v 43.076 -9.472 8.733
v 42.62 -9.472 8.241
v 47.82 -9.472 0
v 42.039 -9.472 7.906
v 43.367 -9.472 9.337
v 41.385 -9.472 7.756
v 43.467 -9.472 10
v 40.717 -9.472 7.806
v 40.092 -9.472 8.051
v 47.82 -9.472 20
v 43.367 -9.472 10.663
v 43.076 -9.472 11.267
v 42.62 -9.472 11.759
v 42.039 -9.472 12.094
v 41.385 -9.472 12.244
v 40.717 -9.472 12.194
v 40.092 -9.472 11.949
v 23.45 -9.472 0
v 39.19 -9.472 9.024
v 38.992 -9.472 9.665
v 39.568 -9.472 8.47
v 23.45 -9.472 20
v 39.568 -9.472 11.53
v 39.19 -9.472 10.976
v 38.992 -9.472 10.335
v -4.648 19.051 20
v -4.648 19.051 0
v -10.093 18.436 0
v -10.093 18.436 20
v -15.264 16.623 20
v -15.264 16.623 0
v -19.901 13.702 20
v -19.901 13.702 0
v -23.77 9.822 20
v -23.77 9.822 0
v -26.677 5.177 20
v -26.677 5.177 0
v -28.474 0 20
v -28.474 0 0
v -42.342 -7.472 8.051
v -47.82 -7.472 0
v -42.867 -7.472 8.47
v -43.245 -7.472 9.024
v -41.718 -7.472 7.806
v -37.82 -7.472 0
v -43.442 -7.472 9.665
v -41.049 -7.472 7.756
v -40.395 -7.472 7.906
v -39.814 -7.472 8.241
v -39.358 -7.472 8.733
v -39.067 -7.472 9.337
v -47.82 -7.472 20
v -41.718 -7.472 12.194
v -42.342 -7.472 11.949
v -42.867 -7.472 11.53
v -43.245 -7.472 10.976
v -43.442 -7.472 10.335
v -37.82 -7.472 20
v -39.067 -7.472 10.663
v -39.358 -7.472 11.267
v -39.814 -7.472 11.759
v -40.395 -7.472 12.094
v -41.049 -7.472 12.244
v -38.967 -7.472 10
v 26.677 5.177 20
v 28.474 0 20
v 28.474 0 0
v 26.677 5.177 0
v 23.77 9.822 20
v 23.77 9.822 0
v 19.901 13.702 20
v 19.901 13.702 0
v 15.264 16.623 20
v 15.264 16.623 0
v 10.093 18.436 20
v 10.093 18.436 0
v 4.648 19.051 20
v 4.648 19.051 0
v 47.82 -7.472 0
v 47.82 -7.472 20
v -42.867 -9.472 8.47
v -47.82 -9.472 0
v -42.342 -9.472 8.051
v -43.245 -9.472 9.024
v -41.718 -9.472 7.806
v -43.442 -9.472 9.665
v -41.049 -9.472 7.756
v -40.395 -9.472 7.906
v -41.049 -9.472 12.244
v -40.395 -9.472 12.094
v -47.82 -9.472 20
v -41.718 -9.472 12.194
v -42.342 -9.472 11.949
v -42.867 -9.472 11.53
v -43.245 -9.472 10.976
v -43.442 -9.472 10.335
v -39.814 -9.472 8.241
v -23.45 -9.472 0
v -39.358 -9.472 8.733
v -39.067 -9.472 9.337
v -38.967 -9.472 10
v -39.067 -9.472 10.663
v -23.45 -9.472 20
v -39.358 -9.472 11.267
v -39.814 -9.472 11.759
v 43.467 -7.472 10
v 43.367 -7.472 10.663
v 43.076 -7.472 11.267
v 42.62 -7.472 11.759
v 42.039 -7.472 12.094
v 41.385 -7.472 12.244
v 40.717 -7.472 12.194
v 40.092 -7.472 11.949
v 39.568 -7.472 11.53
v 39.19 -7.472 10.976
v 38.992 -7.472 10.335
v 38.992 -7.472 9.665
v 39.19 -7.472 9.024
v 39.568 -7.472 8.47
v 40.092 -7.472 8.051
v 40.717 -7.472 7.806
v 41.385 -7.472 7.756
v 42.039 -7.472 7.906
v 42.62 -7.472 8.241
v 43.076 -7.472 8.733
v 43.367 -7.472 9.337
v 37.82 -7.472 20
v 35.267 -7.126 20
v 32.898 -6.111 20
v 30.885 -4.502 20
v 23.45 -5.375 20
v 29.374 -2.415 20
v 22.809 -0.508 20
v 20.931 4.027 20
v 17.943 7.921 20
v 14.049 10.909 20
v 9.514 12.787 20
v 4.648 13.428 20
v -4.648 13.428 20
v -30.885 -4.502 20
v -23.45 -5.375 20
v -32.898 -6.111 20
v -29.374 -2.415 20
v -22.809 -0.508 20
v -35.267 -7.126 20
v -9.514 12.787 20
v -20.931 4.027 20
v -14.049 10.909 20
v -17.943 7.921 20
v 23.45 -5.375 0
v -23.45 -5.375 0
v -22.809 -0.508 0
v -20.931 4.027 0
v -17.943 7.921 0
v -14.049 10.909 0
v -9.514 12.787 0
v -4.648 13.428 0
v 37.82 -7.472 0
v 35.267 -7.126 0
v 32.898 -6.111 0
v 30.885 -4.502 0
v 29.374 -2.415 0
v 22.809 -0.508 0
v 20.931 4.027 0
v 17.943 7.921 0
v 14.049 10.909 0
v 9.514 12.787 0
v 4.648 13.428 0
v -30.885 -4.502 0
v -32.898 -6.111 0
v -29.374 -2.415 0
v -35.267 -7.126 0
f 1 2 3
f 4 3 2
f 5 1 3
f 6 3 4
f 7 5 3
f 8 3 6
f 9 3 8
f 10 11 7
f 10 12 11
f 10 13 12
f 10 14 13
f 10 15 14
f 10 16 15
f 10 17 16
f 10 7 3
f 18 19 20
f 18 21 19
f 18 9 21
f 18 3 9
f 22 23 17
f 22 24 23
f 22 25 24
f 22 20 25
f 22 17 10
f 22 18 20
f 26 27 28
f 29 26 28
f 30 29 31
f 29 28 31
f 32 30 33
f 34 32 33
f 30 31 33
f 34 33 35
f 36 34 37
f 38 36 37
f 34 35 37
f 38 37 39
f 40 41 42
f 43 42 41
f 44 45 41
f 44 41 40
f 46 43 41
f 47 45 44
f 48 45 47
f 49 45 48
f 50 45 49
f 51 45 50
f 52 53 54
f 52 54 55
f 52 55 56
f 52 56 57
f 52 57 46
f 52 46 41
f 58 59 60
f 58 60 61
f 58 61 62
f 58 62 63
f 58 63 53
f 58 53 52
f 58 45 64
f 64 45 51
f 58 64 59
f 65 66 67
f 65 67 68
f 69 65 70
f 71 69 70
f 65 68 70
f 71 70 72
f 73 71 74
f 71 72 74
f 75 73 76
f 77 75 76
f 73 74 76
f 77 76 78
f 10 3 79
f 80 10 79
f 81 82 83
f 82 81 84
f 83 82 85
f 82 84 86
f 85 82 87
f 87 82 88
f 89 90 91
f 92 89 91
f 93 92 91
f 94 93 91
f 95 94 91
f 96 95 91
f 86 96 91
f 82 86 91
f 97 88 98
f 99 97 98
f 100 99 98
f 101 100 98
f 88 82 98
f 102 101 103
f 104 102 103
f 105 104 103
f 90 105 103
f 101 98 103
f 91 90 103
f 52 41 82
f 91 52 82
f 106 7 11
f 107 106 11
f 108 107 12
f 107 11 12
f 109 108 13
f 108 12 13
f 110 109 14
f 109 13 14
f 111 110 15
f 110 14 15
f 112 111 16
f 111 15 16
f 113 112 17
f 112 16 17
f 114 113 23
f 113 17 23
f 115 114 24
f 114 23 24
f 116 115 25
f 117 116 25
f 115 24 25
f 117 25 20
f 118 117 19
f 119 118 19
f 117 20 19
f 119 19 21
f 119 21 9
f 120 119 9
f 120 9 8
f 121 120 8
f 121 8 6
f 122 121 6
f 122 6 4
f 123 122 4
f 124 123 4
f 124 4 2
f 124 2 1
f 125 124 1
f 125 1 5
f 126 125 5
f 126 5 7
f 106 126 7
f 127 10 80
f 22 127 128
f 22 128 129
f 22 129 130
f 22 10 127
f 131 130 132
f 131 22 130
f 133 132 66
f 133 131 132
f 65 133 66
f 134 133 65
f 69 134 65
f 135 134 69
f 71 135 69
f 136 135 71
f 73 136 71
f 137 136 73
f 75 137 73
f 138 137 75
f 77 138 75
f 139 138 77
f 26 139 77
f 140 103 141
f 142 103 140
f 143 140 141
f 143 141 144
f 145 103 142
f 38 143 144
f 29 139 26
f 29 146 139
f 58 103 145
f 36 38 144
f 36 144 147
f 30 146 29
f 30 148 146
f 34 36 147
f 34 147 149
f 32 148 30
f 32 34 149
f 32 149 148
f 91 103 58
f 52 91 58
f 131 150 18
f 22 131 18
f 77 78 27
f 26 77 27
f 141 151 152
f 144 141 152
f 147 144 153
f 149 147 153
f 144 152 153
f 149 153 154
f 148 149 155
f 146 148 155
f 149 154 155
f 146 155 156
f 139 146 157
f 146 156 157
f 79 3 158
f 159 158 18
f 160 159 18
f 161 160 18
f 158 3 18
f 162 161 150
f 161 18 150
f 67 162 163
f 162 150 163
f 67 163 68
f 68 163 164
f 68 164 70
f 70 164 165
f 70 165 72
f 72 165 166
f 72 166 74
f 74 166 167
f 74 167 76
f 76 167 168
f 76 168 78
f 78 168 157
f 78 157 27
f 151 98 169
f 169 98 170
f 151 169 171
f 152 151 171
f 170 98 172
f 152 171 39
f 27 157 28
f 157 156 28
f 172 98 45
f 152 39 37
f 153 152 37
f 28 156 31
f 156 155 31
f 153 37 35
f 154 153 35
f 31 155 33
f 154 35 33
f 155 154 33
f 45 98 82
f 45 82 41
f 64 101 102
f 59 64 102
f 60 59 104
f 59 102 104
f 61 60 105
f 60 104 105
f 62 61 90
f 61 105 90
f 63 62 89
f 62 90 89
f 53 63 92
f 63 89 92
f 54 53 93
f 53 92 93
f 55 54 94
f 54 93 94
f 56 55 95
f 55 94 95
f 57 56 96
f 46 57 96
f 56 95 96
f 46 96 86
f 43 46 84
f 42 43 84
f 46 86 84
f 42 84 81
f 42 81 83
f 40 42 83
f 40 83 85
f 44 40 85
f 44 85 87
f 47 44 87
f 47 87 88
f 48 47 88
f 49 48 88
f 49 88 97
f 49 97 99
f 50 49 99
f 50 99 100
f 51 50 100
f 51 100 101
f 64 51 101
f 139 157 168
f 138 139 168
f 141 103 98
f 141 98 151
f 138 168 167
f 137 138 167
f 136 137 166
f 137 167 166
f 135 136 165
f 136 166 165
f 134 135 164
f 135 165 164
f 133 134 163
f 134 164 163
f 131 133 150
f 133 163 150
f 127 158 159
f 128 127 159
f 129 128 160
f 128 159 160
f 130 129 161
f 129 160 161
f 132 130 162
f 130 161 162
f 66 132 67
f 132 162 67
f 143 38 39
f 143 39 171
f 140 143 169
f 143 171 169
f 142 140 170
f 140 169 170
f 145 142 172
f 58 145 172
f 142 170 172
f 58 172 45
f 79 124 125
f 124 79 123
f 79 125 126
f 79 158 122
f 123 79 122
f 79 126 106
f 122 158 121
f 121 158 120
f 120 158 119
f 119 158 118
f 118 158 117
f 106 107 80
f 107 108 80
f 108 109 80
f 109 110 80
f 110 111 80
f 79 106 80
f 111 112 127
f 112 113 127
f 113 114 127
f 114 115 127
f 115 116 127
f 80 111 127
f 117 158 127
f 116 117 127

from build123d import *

# Parameters (mm, degrees)
F1_DEPTH = 20
F3_D     = 4.5
F4_D     = 4.5
F5_DEPTH = 2
F6_DEPTH = 2


with BuildPart() as f1:
    # F0 (on Top) → F1 (new body)
    with BuildSketch(Plane.XY):
        with BuildLine():
            Line((-37.8199822518, -7.4723315098), (-45.8199822518, -7.4723315098))
            Line((-45.8199822518, -7.4723315098), (-45.8199822518, -9.4723315098))
            Line((-45.8199822518, -9.4723315098), (-28.8447495745, -9.4723315098))
            Line((-28.8447495745, -9.4723315098), (-23.45, -9.4723315098))
            Line((-23.45, -9.4723315098), (-23.45, -7.887919838))
            Line((-23.45, -7.887919838), (-23.45, -5.3745856304))
            ThreePointArc((-23.45, -5.3745856304), (-17.9429472697, 7.9206157599), (-4.6477458794, 13.4276684902))
            Line((-4.6477458794, 13.4276684902), (0, 13.4276684902))
            Line((0, 13.4276684902), (4.6477458794, 13.4276684902))
            ThreePointArc((4.6477458794, 13.4276684902), (17.9429472697, 7.9206157599), (23.45, -5.3745856304))
            Line((23.45, -5.3745856304), (23.45, -7.887919838))
            Line((23.45, -7.887919838), (23.45, -9.4723315098))
            Line((23.45, -9.4723315098), (28.8447495745, -9.4723315098))
            Line((28.8447495745, -9.4723315098), (45.8199822518, -9.4723315098))
            Line((45.8199822518, -9.4723315098), (45.8199822518, -7.4723315098))
            Line((45.8199822518, -7.4723315098), (37.8199822518, -7.4723315098))
            ThreePointArc((37.8199822518, -7.4723315098), (31.8371692612, -5.3745856304), (28.4743700766, 0))
            ThreePointArc((28.4743700766, 0), (19.9009167747, 13.7024940459), (4.6477458794, 19.0506920822))
            Line((4.6477458794, 19.0506920822), (0, 19.0506920822))
            Line((0, 19.0506920822), (-4.6477458794, 19.0506920822))
            ThreePointArc((-4.6477458794, 19.0506920822), (-19.9009167747, 13.7024940459), (-28.4743700766, 0))
            ThreePointArc((-28.4743700766, 0), (-31.8371692612, -5.3745856304), (-37.8199822518, -7.4723315098))
        make_face()
    extrude(amount=F1_DEPTH)

    # F3 (through all)
    with Locations(Plane(origin=(0, -7.4723315098, 0), x_dir=(-1, 0, 0), z_dir=(0, 1, 0))):
        with Locations((-41.2173499218, 10)):
            Hole(F3_D / 2)

    # F4 (through all)
    with Locations(Plane(origin=(0, -7.4723315098, 0), x_dir=(-1, 0, 0), z_dir=(0, 1, 0))):
        with Locations((41.2173499218, 10)):
            Hole(F4_D / 2)

    # F5 (add): a face of the model
    f5_faces = [f1.faces().sort_by_distance(p)[0] for p in [
        (-45.8199822518, -8.4723315098, 10),
    ]]
    extrude(f5_faces, amount=F5_DEPTH)

    # F6 (add): a face of the model
    f6_faces = [f1.faces().sort_by_distance(p)[0] for p in [
        (45.8199822518, -8.4723315098, 10),
    ]]
    extrude(f6_faces, amount=F6_DEPTH)


solid = f1.part
